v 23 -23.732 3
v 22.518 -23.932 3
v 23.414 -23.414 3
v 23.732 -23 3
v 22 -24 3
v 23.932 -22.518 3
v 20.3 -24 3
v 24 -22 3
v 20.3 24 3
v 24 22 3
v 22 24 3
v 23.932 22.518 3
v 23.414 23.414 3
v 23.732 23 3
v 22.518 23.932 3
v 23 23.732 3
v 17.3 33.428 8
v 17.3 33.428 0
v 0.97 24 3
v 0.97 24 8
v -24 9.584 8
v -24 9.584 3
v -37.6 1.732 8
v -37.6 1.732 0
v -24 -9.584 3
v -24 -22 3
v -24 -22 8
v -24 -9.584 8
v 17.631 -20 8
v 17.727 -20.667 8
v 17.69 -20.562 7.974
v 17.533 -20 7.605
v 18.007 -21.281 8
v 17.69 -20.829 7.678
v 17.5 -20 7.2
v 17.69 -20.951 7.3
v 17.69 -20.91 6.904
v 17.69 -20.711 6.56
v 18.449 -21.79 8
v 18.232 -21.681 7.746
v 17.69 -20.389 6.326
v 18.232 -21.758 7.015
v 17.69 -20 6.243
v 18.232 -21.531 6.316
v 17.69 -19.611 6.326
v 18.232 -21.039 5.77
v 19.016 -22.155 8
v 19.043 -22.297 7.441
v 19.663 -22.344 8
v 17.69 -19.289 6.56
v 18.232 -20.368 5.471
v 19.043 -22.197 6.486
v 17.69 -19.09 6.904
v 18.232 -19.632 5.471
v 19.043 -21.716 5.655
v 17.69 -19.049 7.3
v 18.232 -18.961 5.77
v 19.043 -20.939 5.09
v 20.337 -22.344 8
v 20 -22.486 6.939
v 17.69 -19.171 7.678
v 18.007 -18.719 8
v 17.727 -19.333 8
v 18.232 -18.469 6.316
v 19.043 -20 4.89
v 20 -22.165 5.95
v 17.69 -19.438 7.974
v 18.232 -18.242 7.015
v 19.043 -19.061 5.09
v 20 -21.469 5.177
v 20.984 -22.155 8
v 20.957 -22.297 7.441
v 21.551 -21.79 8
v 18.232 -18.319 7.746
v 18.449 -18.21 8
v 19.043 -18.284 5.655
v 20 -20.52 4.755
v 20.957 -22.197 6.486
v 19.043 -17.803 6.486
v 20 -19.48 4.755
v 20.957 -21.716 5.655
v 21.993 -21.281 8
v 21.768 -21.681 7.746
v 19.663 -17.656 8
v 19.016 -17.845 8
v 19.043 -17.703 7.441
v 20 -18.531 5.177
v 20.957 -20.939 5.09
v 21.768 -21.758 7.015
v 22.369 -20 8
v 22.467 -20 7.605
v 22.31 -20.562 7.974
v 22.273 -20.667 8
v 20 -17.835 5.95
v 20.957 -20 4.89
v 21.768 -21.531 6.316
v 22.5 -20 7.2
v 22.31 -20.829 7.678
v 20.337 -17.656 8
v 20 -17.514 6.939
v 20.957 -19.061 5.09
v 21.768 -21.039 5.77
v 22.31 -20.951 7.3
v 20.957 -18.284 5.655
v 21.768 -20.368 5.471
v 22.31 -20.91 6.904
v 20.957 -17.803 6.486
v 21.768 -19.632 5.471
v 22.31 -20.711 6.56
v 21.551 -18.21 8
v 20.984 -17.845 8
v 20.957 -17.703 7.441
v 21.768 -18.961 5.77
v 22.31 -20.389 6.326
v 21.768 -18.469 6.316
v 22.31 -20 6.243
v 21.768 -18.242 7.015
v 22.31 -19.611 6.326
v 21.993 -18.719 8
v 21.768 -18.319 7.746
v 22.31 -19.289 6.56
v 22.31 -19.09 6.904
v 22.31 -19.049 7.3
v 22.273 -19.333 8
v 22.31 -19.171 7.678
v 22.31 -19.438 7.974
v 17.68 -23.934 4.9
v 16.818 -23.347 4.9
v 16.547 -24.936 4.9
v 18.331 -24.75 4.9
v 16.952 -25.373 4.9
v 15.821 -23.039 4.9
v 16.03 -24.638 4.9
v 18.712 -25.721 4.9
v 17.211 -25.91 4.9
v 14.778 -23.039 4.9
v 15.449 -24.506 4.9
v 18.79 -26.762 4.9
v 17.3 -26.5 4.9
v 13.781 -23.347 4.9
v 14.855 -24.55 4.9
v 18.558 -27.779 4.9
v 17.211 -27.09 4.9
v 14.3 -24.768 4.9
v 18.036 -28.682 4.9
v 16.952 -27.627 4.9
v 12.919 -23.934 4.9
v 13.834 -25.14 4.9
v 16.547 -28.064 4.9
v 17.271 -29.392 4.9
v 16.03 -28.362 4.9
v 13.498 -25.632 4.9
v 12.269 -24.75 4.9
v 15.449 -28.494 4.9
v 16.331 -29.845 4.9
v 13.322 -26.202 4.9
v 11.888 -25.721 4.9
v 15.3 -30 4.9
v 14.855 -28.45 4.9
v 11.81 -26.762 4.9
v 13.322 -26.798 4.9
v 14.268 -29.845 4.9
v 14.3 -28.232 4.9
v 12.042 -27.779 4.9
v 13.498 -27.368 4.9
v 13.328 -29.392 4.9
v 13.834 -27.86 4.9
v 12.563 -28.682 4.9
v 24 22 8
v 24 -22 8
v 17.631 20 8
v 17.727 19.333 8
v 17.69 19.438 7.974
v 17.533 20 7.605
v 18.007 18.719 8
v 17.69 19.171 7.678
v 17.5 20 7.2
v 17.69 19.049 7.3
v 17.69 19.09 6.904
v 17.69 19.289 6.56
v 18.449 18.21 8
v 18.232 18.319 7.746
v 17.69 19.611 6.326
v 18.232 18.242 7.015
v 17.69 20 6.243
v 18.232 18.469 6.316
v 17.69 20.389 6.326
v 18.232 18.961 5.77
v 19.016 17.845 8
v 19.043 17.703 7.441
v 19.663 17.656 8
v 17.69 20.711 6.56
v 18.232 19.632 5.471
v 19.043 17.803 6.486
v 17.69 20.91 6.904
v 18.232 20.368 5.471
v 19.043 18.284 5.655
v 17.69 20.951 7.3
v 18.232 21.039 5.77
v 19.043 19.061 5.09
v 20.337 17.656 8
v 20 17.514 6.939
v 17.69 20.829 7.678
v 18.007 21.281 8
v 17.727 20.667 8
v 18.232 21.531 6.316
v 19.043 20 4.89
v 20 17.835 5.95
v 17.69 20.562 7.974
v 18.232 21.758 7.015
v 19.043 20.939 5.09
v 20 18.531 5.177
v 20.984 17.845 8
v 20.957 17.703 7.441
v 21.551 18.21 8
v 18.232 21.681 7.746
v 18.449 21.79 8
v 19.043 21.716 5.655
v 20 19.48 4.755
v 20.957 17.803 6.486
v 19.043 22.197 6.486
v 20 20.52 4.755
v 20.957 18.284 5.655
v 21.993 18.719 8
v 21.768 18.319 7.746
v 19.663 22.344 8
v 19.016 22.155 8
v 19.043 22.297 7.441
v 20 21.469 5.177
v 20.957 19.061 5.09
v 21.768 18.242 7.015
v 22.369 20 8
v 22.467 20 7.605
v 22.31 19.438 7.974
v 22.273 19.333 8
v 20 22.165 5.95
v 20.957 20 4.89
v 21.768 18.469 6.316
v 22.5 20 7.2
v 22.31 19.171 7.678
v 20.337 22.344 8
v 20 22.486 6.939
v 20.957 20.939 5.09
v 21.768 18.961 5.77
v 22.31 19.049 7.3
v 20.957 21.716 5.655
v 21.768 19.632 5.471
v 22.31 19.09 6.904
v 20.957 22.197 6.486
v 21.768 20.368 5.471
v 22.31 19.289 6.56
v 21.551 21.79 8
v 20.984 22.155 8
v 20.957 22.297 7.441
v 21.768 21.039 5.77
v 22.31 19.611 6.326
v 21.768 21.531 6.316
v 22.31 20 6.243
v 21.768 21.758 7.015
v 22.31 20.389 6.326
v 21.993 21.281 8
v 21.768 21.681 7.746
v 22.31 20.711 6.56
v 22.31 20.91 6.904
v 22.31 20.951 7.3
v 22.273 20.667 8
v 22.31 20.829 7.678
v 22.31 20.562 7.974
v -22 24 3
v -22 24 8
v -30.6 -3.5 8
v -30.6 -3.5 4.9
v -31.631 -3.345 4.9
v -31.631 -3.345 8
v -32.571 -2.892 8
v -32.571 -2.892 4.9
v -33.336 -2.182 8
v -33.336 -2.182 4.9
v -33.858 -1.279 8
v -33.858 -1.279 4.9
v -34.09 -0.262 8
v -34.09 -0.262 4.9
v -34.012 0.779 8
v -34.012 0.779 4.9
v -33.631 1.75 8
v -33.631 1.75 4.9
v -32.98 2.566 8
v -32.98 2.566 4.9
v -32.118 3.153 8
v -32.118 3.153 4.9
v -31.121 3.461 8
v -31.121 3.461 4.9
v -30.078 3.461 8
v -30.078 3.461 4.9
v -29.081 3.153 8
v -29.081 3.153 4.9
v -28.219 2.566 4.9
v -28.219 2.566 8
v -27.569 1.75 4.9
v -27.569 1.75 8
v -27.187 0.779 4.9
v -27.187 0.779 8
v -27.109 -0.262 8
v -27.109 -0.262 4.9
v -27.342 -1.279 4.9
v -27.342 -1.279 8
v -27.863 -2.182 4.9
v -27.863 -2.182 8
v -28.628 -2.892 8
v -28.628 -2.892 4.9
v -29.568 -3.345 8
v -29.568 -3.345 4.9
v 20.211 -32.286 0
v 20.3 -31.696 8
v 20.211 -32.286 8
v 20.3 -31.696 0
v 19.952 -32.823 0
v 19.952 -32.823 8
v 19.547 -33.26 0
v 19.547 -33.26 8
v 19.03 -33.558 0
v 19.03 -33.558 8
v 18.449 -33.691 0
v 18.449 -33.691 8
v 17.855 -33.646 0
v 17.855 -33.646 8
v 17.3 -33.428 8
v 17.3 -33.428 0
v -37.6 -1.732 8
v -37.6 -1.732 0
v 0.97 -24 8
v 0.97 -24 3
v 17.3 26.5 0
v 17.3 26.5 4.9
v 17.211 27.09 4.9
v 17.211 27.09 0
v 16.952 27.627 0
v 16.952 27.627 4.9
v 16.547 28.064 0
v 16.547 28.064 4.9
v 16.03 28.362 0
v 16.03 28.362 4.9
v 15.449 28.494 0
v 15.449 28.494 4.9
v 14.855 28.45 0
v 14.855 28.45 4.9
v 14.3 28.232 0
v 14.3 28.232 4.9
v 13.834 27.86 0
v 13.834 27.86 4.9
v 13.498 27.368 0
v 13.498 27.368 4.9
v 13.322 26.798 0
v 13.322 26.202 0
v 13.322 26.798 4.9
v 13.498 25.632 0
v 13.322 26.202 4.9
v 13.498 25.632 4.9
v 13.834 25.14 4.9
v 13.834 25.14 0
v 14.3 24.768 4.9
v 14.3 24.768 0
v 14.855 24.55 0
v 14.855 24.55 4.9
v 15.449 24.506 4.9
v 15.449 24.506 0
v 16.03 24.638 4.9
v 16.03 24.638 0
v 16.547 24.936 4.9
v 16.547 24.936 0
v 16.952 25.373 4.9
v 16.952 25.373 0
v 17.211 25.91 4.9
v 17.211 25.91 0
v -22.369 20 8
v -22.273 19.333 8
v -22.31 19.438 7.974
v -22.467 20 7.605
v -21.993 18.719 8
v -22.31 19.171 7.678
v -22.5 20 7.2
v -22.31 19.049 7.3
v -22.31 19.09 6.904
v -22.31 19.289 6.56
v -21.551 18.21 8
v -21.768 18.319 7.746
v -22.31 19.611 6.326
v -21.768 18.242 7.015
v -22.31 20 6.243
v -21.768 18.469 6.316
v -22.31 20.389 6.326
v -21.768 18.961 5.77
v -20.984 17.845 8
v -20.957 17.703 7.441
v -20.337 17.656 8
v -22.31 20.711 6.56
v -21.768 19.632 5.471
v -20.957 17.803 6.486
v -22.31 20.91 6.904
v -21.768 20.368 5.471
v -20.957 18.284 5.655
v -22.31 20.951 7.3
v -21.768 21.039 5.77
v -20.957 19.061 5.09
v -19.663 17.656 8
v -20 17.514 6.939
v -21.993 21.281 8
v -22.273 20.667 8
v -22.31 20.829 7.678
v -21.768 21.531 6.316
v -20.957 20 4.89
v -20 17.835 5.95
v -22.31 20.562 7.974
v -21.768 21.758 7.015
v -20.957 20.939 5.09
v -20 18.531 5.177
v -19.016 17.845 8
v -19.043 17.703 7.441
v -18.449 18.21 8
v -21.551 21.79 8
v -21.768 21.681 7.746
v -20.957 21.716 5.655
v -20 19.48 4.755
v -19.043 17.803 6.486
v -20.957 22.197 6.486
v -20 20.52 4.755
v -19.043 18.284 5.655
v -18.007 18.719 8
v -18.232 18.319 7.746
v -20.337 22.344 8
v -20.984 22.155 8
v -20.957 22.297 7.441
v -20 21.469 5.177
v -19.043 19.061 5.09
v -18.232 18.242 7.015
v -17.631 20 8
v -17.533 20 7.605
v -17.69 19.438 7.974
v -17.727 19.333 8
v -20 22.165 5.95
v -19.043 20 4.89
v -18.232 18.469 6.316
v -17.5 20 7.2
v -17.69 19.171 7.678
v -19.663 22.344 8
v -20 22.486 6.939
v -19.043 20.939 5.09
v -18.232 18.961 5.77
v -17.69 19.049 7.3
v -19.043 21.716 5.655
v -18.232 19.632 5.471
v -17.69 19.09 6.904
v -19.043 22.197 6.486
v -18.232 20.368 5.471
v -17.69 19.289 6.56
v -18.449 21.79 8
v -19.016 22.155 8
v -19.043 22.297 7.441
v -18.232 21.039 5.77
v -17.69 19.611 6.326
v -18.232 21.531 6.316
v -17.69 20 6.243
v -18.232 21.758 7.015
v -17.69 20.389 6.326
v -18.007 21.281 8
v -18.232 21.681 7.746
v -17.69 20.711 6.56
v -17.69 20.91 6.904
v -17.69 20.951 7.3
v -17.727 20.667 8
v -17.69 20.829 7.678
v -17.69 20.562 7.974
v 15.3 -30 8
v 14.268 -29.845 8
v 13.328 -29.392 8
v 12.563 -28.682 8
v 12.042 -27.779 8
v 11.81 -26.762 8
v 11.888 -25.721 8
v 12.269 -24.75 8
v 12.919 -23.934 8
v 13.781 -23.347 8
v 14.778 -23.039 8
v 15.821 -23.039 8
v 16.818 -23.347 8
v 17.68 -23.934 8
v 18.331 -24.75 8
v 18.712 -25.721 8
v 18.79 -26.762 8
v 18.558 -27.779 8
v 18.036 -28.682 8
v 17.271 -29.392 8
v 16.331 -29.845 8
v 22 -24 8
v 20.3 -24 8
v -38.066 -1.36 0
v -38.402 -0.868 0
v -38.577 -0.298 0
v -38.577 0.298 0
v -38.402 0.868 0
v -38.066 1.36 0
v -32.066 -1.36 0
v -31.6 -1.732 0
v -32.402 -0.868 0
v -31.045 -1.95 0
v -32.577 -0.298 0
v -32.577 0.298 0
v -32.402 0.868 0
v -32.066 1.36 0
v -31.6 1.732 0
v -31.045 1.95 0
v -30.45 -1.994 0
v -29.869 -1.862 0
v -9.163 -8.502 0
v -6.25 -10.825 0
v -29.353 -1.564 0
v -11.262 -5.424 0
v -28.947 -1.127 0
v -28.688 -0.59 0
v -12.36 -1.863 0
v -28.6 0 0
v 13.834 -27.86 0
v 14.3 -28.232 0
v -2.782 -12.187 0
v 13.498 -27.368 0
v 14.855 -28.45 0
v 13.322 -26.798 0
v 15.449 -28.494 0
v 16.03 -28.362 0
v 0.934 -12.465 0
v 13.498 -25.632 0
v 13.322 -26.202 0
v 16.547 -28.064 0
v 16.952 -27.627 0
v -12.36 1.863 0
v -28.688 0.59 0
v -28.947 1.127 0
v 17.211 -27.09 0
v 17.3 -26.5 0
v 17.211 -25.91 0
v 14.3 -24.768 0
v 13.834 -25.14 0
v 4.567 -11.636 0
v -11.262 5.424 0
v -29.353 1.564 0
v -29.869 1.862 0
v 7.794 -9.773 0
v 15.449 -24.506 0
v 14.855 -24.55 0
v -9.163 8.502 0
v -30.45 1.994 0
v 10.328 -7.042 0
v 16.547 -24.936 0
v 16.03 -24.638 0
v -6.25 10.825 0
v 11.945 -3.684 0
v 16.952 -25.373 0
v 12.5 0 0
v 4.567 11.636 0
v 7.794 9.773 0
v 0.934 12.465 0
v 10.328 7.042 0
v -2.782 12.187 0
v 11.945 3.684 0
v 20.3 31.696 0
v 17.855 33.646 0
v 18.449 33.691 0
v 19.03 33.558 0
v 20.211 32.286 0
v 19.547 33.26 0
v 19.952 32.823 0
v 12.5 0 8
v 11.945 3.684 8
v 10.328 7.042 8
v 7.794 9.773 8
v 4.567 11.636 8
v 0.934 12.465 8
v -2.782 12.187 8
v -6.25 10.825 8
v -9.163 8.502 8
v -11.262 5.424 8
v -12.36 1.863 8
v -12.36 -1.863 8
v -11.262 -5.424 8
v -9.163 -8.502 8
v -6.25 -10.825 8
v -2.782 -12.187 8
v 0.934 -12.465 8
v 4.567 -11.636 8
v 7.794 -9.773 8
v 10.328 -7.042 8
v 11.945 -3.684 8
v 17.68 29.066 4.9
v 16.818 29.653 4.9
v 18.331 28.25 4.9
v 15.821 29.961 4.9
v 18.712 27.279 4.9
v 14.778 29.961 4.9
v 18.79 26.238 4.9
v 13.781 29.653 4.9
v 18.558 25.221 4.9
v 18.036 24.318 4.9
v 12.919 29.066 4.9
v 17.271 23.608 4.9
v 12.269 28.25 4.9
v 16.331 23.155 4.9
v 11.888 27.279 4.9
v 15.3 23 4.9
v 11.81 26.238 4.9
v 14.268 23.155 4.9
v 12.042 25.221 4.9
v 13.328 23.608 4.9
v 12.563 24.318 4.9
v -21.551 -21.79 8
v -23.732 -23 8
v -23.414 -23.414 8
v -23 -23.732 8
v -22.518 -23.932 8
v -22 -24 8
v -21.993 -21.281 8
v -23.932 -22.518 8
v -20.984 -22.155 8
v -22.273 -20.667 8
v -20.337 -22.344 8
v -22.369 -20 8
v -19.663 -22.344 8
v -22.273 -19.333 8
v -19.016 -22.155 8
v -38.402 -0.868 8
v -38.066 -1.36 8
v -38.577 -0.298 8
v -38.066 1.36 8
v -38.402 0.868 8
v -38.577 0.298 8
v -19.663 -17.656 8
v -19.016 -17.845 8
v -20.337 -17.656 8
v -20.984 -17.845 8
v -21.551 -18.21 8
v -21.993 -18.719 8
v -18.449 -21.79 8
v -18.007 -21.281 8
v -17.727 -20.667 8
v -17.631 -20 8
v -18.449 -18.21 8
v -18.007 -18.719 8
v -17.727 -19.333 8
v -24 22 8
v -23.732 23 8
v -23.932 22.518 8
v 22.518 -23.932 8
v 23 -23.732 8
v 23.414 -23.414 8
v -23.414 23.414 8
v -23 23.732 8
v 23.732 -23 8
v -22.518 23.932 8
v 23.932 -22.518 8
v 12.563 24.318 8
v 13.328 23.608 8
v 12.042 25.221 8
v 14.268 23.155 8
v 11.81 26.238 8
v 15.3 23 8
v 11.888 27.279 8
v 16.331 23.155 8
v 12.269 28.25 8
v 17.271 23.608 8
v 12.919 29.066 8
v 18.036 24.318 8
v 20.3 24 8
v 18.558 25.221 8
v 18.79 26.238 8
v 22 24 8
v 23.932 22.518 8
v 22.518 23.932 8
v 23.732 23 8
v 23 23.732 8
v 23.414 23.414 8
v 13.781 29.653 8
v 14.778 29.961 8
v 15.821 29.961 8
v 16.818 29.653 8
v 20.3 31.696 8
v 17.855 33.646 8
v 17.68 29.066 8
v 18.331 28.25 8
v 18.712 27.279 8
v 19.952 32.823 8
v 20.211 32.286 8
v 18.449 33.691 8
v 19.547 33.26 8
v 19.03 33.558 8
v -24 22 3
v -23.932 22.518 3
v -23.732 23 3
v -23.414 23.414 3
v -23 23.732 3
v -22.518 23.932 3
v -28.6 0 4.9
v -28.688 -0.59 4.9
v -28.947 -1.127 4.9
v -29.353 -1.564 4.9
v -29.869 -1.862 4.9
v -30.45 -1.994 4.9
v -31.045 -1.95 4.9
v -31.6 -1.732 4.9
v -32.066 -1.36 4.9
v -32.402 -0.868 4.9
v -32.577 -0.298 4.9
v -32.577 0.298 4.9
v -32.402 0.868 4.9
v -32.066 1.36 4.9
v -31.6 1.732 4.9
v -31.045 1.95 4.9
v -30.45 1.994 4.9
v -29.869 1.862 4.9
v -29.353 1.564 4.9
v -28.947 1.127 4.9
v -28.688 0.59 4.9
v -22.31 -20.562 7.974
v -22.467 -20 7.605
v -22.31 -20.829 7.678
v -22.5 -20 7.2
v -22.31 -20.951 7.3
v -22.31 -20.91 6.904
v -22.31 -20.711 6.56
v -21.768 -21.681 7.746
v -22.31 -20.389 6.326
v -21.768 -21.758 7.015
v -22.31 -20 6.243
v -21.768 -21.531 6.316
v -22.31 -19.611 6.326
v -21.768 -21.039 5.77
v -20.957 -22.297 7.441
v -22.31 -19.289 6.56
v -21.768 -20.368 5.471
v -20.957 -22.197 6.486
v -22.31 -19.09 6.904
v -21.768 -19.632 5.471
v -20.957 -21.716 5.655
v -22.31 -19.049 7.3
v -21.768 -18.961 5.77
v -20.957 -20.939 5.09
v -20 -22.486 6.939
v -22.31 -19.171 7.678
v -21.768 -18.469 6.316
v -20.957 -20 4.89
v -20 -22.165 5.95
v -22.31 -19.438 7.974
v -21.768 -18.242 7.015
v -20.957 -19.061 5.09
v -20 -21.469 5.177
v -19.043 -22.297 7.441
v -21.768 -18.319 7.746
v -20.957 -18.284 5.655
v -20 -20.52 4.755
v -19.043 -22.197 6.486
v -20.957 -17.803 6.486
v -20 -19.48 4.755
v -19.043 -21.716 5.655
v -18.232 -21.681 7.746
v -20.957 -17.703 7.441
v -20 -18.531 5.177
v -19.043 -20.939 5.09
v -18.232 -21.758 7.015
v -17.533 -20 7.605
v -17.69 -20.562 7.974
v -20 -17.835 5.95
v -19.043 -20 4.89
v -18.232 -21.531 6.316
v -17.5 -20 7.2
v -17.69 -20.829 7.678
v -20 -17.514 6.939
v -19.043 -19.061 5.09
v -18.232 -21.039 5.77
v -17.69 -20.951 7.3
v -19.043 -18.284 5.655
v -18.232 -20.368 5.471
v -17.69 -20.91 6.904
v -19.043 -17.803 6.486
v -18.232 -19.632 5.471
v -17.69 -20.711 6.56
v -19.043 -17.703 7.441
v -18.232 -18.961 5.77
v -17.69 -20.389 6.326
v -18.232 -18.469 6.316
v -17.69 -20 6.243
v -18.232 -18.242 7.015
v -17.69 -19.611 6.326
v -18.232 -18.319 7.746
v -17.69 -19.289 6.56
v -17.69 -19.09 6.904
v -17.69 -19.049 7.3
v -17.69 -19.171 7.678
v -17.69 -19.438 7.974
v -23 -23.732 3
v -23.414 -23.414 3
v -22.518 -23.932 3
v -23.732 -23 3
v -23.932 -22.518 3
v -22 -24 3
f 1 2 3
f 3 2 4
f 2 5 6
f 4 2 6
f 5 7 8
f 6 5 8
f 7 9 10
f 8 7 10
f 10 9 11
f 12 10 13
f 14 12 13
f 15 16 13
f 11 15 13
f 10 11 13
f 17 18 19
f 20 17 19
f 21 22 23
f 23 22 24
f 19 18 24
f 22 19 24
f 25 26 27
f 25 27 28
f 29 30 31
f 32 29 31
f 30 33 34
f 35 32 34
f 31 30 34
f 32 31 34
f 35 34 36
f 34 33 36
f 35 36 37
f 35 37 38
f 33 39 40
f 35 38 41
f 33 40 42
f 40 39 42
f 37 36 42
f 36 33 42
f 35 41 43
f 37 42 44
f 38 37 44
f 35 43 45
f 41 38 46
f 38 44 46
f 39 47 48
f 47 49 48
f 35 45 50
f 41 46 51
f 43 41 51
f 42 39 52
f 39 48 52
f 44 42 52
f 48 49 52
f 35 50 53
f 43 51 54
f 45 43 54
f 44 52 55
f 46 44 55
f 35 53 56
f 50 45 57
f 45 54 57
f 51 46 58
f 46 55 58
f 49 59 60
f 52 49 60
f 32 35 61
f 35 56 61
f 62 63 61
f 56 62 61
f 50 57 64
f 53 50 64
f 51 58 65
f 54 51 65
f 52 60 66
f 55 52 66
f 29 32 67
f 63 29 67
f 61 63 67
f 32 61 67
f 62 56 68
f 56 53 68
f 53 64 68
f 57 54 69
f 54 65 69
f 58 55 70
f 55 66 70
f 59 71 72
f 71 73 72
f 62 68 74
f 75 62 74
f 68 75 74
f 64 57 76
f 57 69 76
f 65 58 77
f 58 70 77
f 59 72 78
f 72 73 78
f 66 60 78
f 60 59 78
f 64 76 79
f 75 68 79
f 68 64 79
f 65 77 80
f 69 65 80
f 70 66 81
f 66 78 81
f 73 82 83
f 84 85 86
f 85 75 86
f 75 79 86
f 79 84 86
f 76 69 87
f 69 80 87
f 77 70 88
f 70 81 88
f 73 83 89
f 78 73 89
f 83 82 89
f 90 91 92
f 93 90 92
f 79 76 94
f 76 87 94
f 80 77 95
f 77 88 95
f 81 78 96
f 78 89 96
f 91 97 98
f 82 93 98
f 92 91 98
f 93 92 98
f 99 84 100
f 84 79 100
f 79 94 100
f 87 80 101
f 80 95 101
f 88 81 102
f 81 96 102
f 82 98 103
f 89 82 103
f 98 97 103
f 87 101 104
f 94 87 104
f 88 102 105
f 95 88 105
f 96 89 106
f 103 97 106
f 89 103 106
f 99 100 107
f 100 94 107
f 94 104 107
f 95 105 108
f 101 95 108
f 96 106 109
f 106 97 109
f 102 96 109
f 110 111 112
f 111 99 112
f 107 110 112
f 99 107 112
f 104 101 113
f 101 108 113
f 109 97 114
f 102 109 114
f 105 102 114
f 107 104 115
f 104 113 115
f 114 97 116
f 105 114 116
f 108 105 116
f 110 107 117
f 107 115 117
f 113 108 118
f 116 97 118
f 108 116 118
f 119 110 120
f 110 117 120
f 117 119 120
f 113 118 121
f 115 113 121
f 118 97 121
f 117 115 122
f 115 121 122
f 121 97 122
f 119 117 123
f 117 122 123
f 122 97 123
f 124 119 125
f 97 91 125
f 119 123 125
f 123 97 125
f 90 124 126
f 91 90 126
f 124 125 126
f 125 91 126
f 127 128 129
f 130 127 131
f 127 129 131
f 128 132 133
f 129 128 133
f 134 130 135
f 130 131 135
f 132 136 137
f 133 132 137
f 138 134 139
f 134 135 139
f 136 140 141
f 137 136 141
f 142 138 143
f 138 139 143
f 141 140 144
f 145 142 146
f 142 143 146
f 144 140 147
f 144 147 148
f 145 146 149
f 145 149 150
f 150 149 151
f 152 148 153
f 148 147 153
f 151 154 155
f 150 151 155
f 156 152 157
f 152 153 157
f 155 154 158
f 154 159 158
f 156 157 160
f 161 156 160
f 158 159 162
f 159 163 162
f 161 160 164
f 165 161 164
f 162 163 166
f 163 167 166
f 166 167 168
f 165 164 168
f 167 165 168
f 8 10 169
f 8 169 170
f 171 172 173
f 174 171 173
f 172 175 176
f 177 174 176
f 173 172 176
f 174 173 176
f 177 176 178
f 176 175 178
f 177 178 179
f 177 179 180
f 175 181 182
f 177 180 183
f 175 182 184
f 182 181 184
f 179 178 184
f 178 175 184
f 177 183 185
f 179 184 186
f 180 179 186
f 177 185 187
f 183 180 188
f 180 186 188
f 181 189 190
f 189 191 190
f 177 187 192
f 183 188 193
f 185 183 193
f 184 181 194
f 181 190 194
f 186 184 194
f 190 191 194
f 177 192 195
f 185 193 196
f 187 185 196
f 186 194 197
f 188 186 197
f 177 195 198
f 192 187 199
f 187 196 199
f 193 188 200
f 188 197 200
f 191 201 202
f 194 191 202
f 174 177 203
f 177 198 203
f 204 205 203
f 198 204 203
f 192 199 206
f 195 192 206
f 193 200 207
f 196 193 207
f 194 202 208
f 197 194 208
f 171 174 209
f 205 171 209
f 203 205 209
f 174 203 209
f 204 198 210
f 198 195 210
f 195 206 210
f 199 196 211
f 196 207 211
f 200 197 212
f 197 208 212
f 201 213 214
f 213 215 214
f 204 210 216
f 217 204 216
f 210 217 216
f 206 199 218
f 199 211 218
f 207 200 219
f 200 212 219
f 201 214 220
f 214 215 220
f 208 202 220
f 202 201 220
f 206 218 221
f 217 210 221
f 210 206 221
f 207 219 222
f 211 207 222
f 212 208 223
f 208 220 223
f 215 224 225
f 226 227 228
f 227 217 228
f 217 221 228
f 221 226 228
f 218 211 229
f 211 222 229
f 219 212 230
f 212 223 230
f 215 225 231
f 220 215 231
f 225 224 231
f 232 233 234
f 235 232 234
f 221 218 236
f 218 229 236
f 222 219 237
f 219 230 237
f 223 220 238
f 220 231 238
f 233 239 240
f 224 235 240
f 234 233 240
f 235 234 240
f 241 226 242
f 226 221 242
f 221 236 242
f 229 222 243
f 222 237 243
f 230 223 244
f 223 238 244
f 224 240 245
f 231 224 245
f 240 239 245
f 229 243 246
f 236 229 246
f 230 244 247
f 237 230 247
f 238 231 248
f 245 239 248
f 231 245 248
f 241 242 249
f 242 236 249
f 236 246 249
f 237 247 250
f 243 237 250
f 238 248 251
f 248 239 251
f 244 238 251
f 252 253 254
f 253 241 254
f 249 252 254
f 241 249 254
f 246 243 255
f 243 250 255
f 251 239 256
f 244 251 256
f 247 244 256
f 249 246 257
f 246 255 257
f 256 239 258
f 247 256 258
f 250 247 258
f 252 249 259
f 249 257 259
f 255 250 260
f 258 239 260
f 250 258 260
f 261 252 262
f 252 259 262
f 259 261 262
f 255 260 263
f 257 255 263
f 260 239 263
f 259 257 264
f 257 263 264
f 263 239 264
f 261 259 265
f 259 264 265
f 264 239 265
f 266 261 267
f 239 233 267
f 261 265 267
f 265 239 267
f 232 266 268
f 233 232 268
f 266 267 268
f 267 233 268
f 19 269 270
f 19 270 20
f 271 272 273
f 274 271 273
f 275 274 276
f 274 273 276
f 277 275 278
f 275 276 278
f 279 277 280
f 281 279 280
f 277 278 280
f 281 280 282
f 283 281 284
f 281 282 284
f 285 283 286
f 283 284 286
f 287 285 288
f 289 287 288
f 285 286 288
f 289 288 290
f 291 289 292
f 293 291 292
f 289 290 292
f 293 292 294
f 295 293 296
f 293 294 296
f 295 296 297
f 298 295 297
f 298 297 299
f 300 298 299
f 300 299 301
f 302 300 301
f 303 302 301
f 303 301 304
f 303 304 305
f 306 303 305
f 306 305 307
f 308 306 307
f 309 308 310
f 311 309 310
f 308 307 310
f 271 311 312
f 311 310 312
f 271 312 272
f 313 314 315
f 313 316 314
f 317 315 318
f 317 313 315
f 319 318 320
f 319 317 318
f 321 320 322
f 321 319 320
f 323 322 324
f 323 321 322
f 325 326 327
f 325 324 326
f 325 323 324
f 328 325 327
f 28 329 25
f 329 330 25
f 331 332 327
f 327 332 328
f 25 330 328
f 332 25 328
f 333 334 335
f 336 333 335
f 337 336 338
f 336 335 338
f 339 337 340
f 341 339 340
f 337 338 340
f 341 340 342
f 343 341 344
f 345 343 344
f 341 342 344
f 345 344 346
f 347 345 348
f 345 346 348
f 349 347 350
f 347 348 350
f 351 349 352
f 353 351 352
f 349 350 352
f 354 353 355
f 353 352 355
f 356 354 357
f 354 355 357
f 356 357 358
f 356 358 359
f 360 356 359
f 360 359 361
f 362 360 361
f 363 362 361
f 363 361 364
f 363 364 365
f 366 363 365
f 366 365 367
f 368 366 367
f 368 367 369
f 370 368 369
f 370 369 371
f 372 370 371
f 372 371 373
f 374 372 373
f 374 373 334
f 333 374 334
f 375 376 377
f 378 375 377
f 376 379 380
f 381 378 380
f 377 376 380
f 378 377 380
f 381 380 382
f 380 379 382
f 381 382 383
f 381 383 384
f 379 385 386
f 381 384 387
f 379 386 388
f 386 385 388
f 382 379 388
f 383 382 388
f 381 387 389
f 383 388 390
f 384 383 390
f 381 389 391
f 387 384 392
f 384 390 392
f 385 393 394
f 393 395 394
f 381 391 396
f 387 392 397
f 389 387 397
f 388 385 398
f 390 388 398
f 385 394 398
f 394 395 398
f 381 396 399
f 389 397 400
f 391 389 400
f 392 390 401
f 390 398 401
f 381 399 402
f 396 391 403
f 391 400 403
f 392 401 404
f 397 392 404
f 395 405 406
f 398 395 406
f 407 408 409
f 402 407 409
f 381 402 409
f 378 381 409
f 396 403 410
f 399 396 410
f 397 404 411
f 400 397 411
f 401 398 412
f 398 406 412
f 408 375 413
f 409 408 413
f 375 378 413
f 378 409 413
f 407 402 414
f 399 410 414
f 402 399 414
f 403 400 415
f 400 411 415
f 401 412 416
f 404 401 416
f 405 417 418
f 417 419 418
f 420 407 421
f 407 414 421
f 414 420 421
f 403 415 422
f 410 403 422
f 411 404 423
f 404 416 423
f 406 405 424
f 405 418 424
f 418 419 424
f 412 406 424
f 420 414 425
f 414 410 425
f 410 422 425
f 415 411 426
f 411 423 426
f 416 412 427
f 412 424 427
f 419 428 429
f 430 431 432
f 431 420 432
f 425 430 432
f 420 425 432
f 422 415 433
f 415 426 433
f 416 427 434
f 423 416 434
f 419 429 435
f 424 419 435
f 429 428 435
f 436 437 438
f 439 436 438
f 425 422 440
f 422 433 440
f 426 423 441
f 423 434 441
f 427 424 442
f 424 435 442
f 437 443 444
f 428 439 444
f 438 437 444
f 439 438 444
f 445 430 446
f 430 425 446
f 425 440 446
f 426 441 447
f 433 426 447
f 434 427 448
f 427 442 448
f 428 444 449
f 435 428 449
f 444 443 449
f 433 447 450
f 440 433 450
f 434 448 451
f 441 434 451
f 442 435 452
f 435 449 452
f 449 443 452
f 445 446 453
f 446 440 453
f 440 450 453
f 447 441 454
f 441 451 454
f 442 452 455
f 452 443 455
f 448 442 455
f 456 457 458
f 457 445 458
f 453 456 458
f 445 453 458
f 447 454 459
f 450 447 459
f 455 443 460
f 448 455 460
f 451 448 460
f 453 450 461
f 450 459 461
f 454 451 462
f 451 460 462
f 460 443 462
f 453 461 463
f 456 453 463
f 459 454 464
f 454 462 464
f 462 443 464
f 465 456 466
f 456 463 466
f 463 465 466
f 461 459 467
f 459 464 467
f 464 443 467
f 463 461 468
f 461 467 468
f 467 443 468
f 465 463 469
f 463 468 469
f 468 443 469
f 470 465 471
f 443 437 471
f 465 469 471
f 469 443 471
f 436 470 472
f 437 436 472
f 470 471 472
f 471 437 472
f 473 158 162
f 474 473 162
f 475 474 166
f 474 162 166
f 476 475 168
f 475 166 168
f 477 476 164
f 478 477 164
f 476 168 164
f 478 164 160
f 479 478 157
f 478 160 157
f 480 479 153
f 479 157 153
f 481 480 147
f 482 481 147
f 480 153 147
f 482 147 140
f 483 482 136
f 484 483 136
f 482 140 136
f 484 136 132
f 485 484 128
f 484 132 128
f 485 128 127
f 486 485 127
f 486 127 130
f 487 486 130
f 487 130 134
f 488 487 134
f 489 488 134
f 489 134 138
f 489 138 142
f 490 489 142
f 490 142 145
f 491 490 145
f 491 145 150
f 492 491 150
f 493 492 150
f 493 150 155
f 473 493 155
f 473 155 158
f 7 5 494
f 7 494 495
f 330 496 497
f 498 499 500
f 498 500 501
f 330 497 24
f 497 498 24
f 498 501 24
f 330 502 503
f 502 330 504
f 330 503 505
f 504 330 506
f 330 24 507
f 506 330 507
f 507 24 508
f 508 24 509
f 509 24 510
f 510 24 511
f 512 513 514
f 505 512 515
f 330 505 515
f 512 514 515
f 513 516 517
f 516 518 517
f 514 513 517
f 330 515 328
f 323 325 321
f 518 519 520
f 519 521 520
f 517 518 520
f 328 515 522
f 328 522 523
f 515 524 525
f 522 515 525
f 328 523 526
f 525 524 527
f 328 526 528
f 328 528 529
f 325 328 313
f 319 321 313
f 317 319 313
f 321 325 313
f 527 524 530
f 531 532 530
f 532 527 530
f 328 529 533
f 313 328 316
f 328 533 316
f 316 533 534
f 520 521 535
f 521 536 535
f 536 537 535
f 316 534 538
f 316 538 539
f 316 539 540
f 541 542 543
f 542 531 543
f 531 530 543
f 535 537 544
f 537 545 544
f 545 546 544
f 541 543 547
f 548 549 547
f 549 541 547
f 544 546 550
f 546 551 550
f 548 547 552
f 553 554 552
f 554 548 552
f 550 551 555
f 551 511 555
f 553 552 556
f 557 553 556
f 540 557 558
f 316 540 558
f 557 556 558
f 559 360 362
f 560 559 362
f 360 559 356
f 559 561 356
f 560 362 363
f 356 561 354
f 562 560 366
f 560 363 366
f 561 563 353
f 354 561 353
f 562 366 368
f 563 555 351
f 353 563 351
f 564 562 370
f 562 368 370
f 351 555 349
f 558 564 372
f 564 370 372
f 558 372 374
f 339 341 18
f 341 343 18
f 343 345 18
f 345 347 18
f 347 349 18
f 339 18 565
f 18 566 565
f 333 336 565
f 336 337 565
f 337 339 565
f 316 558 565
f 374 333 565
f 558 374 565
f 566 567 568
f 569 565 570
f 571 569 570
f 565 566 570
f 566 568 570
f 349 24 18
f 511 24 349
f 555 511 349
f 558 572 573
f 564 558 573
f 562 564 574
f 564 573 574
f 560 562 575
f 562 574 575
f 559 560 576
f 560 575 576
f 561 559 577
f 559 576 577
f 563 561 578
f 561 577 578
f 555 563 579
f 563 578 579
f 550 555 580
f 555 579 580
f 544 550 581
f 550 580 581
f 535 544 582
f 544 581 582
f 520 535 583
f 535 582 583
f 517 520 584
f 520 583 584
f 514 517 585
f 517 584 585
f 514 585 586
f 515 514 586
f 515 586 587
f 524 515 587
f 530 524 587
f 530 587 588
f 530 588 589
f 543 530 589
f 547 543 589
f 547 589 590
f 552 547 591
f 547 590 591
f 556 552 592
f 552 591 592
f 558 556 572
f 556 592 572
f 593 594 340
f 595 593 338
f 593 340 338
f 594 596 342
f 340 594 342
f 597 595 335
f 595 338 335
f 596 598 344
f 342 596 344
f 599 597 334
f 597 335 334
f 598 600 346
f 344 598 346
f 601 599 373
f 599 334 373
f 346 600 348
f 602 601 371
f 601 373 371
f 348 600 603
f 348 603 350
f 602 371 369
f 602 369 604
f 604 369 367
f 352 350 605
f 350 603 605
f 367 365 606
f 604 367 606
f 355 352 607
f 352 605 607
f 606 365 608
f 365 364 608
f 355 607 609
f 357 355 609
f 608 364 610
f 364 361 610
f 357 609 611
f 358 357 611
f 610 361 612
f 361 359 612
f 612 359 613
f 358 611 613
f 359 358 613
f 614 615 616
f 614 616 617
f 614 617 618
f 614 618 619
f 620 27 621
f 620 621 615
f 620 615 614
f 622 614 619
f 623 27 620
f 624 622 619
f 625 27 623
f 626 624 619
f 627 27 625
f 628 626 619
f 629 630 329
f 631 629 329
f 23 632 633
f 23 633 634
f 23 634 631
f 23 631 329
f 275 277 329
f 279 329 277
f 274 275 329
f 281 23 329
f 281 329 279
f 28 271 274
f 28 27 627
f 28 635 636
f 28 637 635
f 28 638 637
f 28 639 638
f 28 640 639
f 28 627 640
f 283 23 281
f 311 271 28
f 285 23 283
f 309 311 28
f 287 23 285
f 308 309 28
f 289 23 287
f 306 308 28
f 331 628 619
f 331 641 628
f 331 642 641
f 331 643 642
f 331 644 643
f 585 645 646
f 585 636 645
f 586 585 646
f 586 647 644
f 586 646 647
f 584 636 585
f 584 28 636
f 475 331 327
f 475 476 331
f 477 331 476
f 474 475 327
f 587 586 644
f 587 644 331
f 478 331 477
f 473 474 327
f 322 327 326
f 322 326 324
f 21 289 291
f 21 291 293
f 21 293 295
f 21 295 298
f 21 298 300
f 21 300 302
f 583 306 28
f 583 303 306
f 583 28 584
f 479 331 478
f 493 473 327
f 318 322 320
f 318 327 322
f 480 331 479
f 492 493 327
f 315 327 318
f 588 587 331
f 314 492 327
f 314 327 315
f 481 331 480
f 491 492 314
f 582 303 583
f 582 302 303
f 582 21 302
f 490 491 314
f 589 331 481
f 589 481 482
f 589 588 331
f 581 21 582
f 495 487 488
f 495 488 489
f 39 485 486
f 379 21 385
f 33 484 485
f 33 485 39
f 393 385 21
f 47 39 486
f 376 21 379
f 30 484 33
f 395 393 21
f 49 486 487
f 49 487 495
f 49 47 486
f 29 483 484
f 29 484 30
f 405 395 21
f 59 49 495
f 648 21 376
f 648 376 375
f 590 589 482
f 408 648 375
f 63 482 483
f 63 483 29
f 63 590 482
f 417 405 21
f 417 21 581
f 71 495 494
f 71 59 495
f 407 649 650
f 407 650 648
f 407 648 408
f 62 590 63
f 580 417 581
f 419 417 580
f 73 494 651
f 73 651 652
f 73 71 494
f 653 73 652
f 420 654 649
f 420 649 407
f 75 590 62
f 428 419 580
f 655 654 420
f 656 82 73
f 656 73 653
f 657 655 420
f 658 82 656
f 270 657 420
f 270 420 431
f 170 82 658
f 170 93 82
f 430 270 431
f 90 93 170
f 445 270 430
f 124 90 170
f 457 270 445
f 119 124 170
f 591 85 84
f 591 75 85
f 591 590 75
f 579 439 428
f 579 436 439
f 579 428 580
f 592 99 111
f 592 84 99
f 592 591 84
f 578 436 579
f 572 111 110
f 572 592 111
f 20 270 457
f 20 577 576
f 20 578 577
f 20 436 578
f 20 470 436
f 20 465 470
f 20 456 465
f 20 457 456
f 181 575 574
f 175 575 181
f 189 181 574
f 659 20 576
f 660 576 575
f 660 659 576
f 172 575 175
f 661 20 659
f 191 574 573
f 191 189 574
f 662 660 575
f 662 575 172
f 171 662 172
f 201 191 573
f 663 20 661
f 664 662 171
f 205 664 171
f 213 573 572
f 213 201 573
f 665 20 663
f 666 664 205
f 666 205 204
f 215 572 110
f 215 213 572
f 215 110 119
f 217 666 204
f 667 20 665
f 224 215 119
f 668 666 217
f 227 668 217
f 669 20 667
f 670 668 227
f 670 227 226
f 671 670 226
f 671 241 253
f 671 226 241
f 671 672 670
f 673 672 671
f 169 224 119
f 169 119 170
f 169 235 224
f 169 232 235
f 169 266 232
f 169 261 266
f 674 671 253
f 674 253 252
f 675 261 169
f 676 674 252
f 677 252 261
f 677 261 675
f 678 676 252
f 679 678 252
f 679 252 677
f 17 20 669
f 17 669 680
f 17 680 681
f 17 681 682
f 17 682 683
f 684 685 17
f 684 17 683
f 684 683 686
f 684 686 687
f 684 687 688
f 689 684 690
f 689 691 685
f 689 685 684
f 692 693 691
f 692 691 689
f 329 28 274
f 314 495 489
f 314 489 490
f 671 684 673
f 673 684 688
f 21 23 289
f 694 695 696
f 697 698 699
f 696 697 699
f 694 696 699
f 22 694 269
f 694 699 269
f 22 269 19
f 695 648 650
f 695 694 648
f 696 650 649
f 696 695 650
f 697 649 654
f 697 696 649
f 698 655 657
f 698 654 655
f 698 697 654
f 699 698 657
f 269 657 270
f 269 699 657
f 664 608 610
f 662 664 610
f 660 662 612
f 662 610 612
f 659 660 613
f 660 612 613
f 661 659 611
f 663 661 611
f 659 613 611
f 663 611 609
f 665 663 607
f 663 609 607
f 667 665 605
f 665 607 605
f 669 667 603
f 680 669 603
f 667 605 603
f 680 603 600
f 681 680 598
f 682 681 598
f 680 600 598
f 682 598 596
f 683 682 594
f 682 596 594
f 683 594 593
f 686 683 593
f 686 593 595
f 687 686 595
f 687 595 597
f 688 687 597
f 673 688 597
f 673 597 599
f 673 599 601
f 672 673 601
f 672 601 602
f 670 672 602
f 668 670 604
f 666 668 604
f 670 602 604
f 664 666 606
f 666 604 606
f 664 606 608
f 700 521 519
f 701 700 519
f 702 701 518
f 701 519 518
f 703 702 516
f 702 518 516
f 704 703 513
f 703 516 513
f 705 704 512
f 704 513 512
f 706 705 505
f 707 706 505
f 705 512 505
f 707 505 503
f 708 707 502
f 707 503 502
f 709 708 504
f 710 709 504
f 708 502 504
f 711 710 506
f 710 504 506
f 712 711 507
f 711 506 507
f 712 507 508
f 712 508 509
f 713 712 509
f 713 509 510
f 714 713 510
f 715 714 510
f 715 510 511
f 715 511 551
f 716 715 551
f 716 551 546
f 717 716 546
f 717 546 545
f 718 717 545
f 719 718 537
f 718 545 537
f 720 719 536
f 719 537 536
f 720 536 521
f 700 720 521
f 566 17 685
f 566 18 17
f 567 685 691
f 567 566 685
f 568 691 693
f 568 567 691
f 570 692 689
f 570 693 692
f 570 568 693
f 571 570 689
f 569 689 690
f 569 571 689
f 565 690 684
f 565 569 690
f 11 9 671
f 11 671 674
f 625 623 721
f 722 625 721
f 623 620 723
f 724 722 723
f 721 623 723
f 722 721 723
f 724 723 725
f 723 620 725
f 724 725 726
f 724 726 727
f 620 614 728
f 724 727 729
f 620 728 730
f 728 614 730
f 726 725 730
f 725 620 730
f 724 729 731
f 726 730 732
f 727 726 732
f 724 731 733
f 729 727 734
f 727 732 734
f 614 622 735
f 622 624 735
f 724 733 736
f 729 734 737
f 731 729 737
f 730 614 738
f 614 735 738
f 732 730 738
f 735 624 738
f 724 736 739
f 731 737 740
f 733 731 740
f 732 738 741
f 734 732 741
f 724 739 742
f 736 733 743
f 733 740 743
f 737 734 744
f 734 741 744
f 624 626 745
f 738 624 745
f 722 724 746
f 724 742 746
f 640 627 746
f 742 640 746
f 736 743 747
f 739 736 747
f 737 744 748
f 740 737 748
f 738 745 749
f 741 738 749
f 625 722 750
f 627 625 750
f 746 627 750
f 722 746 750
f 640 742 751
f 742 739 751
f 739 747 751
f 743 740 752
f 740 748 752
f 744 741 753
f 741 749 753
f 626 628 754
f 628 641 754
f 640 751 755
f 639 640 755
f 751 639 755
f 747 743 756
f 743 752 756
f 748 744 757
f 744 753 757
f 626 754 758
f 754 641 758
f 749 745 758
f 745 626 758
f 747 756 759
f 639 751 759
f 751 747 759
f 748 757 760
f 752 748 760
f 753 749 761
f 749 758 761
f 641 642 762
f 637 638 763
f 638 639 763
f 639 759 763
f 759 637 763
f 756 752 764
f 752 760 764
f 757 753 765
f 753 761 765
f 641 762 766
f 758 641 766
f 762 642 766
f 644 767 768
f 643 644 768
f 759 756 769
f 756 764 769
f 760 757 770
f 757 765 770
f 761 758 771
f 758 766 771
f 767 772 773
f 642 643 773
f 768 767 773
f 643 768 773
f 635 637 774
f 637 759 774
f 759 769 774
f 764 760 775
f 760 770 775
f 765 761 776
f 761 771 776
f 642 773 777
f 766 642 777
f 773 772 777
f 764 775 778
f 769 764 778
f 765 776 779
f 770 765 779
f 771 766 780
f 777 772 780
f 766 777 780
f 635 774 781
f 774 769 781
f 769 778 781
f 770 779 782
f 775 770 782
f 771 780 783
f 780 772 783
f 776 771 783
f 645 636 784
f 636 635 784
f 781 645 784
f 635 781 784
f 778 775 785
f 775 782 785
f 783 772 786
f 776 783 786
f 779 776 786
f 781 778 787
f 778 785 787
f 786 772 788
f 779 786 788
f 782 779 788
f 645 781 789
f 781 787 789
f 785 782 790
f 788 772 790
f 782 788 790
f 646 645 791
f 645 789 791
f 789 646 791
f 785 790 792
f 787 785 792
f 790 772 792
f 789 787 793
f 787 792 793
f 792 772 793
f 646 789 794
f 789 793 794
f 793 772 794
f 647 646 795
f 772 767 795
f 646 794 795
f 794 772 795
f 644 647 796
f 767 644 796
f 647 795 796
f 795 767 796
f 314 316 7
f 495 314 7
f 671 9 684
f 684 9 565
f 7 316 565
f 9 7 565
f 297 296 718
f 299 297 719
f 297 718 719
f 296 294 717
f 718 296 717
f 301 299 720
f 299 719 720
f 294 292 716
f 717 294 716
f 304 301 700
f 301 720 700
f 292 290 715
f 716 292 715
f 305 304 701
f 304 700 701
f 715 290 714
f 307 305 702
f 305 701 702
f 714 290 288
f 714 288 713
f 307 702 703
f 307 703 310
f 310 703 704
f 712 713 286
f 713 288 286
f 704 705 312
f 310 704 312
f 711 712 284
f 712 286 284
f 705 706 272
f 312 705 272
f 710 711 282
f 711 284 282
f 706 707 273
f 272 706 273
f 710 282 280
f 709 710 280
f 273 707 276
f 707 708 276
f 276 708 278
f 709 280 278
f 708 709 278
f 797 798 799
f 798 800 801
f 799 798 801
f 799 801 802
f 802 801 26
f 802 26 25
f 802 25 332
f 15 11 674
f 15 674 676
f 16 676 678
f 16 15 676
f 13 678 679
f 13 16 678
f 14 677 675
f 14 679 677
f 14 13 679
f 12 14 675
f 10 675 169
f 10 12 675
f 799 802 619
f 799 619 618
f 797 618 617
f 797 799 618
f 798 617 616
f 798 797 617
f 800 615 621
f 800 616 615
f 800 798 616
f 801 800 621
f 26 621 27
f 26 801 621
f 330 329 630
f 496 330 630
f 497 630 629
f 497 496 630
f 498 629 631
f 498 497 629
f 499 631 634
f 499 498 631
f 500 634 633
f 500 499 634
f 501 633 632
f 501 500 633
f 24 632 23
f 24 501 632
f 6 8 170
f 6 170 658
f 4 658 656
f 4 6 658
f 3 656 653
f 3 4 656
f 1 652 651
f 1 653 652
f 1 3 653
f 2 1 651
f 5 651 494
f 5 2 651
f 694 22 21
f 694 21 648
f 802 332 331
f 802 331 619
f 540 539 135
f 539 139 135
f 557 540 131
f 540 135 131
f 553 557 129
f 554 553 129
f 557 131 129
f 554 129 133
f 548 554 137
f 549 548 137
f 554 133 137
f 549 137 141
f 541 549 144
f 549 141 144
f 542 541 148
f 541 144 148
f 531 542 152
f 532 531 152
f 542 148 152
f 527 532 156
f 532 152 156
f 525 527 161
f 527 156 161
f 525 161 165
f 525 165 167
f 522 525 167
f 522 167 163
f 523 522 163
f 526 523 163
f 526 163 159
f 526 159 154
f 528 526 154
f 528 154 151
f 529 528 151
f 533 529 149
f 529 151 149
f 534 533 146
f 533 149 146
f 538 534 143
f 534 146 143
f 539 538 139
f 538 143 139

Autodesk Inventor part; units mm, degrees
ref_plane "YZ Plane" through (0, 0, 0) normal (1, 0, 0) x (0, 1, 0)
ref_plane "XZ Plane" through (0, 0, 0) normal (0, 1, 0) x (-1, 0, 0)
ref_plane "XY Plane" through (0, 0, 0) normal (0, 0, 1) x (1, 0, 0)
sketch "Sketch1" plane through (0, 0, 0) normal (0, 0, 1) x (1, 0, 0)
  line L0 (15.2998, 26.5) -> (15.2998, -26.5) construction
  line L1 (15.2998, -26.5) -> (-30.5996, 0) construction
  line L2 (-30.5996, 0) -> (15.2998, 26.5) construction
  line L3 (0, 48.0119) -> (0, -48.0119) projected
  circle A0 centre (0, 0) radius 12.5
  line L4 (24.9, -24.45) -> (-24.9, -24.45) construction
  line L5 (-24.9, -24.45) -> (-24.9, 24.45) construction
  line L6 (-24.9, 24.45) -> (24.9, 24.45) construction
  line L7 (24.9, 24.45) -> (24.9, -24.45) construction
  line L8 (24.9, -24.45) -> (-24.9, 24.45) construction
  line L9 (-24.9, -24.45) -> (24.9, 24.45) construction
  line L10 (20, -20) -> (-20, -20) construction
  line L11 (-20, -20) -> (-20, 20) construction
  line L12 (-20, 20) -> (20, 20) construction
  line L13 (20, 20) -> (20, -20) construction
  line L14 (20, -20) -> (-20, 20) construction
  line L15 (-20, -20) -> (20, 20) construction
  line L16 (-37.5996, -1.7321) -> (17.2998, -33.4282)
  line L17 (20.2998, -31.6962) -> (20.2998, 31.6962)
  line L18 (17.2998, 33.4282) -> (-37.5996, 1.7321)
  arc A1 (-37.5996, 1.7321) -> (-37.5996, -1.7321) centre (-36.5996, 0) ccw
  arc A2 (20.2998, 31.6962) -> (17.2998, 33.4282) centre (18.2998, 31.6962) ccw
  arc A3 (17.2998, -33.4282) -> (20.2998, -31.6962) centre (18.2998, -31.6962) ccw
  circle A4 centre (15.2998, 26.5) radius 2
  circle A5 centre (-30.5996, 0) radius 2
  circle A6 centre (15.2998, -26.5) radius 2
  dimension "d1" = 53
  dimension "d2" = 25
  dimension "d3" = 49.8
  dimension "d4" = 48.9
  dimension "d5" = 40
  dimension "d6" = 40
  dimension "d7" = 5
  dimension "d8" = 2
  dimension "d9" = 4
  dimension "d10" = 4
  dimension "d11" = 4
extrude "Extrusion1" add sketch "Sketch1" along normal blind 3 contours L18 A2 L17 A3 L16 L3 A0 | L3 A0 L16 A1 L18
sketch "Sketch3" plane through (0, 0, 3) normal (0, 0, 1) x (1, 0, 0)
  circle A0 centre (0, 0) radius 12.5 projected
  circle A1 centre (15.2998, -26.5) radius 2 projected
  circle A2 centre (-30.5996, 0) radius 2 projected
  circle A3 centre (15.2998, 26.5) radius 2 projected
  line L0 (-37.5996, -1.7321) -> (17.2998, -33.4282) projected
  arc A4 (17.2998, -33.4282) -> (20.2998, -31.6962) centre (18.2998, -31.6962) ccw projected
  line L1 (20.2998, -31.6962) -> (20.2998, 31.6962) projected
  arc A5 (20.2998, 31.6962) -> (17.2998, 33.4282) centre (18.2998, 31.6962) ccw projected
  line L2 (17.2998, 33.4282) -> (-37.5996, 1.7321) projected
  arc A6 (-37.5996, 1.7321) -> (-37.5996, -1.7321) centre (-36.5996, 0) ccw projected
  line L3 (22, -24) -> (-22, -24)
  line L4 (-24, -22) -> (-24, 22)
  line L5 (-22, 24) -> (22, 24)
  line L6 (24, 22) -> (24, -22)
  line L7 (24, -24) -> (-24, 24) construction
  line L8 (-24, -24) -> (24, 24) construction
  arc A7 (-22, 24) -> (-24, 22) centre (-22, 22) ccw
  arc A8 (-24, -22) -> (-22, -24) centre (-22, -22) ccw
  arc A9 (22, -24) -> (24, -22) centre (22, -22) ccw
  arc A10 (24, 22) -> (22, 24) centre (22, 22) ccw
  line L9 (17.2998, 33.4282) -> (-37.5996, 1.7321) projected
  line L10 (-37.5996, -1.7321) -> (17.2998, -33.4282) projected
  line L11 (20.2998, -31.6962) -> (20.2998, 31.6962) projected
  point P0 (20.2998, 24)
  point P1 (-24, 9.5838)
  point P2 (-24, -9.5838)
  point P3 (0.9697, -24)
  point P4 (20.2998, -24)
  dimension "d14" = 48
  dimension "d15" = 48
  dimension "d16" = 2
extrude "Extrusion2" add sketch "Sketch3" along normal blind 5 contours A0 | A1 | A3 | A6 L2 L4 L0 | L4 L2 L5 L1 L3 L0 | L0 L3 A8 L4 | L3 L1 A4 L0 | L4 A7 L5 L2 | L1 L5 A10 L6 A9 L3 | L2 A5 L1 L5
sketch "Sketch4" plane through (0, 0, 8) normal (0, 0, 1) x (1, 0, 0)
  circle A0 centre (0, 0) radius 12.5 projected
  line L0 (20, -20) -> (-20, -20) construction
  line L1 (-20, -20) -> (-20, 20) construction
  line L2 (-20, 20) -> (20, 20) construction
  line L3 (20, 20) -> (20, -20) construction
  line L4 (20, -20) -> (-20, 20) construction
  line L5 (-20, -20) -> (20, 20) construction
  circle A1 centre (15.2998, 26.5) radius 2 projected
  circle A2 centre (15.2998, -26.5) radius 2 projected
  dimension "d19" = 40
  dimension "d20" = 40
extrude "Extrusion3" cut sketch "Sketch4" against normal through all
ref_plane "Work Plane1" through (-22, 0, 3) normal (0, 1, 0) x (1, 0, 0)
ref_plane "Work Plane2" through (0, -22, 3) normal (-1, 0, 0) x (0, 0, 1)
ref_plane "Work Plane3" through (-22, -20, 3) normal (0, 1, 0) x (1, 0, 0)
sketch "Sketch5" plane through (-22, -20, 3) normal (0, 1, 0) x (1, 0, 0)
  line L0 (22.9697, 0) -> (22.9697, -5) projected
  line L1 (22.9697, 0) -> (0, 0) projected
  line L2 (0, 0) -> (0, -5) projected
  line L3 (22.9697, -5) -> (0, -5) projected
  circle A0 centre (2, -4.2) radius 2.5
  line L4 (22, -11.7547) -> (22, 5.4591) projected
  line L5 (-0.5, -4.2) -> (4.5, -4.2)
  line L6 (0, 0) -> (0, -5) projected
  point P0 (22, 3)
  dimension "d24" = 5
  dimension "d25" = 20
  dimension "d26" = 0.8
revolve "Revolution1" cut sketch "Sketch5" angle 360 about axis through (-22.5, -20, 7.2) along (1, 0, 0) contours A0 L5 L2 L3 | L3 L2 L5 A0
pattern_linear "Rectangular Pattern1" count 2 spacing 40 along (1, 0, 0) count 2 spacing 40 along (0, 1, 0) of "Revolution1"
sketch "Sketch6" plane through (0, 0, 8) normal (0, 0, 1) x (1, 0, 0)
  circle A0 centre (20, 20) radius 2.3685 projected
  circle A1 centre (-20, 20) radius 2.3685 projected
  circle A2 centre (20, -20) radius 2.3685 projected
  circle A3 centre (-20, -20) radius 2.3685 projected
  circle A4 centre (15.2998, -26.5) radius 2 projected
  circle A5 centre (15.2998, 26.5) radius 2 projected
  circle A6 centre (0, 0) radius 12.5 projected
  circle A7 centre (-30.5996, 0) radius 2 projected
  line L0 (0.9697, 24) -> (-22, 24) projected
  arc A8 (-22, 24) -> (-24, 22) centre (-22, 22) ccw projected
  line L1 (-24, 22) -> (-24, 9.5838) projected
  line L2 (-24, 9.5838) -> (-37.5996, 1.7321) projected
  arc A9 (-37.5996, 1.7321) -> (-37.5996, -1.7321) centre (-36.5996, 0) ccw projected
  line L3 (-37.5996, -1.7321) -> (-24, -9.5838) projected
  line L4 (-24, -9.5838) -> (-24, -22) projected
  arc A10 (-24, -22) -> (-22, -24) centre (-22, -22) ccw projected
  line L5 (-22, -24) -> (0.9697, -24) projected
  line L6 (0.9697, -24) -> (17.2998, -33.4282) projected
  arc A11 (17.2998, -33.4282) -> (20.2998, -31.6962) centre (18.2998, -31.6962) ccw projected
  line L7 (20.2998, -31.6962) -> (20.2998, -24) projected
  line L8 (20.2998, -24) -> (22, -24) projected
  arc A12 (22, -24) -> (24, -22) centre (22, -22) ccw projected
  line L9 (24, -22) -> (24, 22) projected
  arc A13 (24, 22) -> (22, 24) centre (22, 22) ccw projected
  line L10 (22, 24) -> (20.2998, 24) projected
  line L11 (20.2998, 24) -> (20.2998, 31.6962) projected
  arc A14 (20.2998, 31.6962) -> (17.2998, 33.4282) centre (18.2998, 31.6962) ccw projected
  line L12 (17.2998, 33.4282) -> (0.9697, 24) projected
hole "Hole1" at (15.2998, 26.5, 8) at (15.2998, -26.5, 8) at (-30.5996, 0, 8) direction (0, 0, -1) diameter 2.8 depth 30 tip angle 118 counterbore diameter 7 counterbore depth 3.1
properties part number "20_Cube_Insert_Openflexure_Deltastage_Adapter"
